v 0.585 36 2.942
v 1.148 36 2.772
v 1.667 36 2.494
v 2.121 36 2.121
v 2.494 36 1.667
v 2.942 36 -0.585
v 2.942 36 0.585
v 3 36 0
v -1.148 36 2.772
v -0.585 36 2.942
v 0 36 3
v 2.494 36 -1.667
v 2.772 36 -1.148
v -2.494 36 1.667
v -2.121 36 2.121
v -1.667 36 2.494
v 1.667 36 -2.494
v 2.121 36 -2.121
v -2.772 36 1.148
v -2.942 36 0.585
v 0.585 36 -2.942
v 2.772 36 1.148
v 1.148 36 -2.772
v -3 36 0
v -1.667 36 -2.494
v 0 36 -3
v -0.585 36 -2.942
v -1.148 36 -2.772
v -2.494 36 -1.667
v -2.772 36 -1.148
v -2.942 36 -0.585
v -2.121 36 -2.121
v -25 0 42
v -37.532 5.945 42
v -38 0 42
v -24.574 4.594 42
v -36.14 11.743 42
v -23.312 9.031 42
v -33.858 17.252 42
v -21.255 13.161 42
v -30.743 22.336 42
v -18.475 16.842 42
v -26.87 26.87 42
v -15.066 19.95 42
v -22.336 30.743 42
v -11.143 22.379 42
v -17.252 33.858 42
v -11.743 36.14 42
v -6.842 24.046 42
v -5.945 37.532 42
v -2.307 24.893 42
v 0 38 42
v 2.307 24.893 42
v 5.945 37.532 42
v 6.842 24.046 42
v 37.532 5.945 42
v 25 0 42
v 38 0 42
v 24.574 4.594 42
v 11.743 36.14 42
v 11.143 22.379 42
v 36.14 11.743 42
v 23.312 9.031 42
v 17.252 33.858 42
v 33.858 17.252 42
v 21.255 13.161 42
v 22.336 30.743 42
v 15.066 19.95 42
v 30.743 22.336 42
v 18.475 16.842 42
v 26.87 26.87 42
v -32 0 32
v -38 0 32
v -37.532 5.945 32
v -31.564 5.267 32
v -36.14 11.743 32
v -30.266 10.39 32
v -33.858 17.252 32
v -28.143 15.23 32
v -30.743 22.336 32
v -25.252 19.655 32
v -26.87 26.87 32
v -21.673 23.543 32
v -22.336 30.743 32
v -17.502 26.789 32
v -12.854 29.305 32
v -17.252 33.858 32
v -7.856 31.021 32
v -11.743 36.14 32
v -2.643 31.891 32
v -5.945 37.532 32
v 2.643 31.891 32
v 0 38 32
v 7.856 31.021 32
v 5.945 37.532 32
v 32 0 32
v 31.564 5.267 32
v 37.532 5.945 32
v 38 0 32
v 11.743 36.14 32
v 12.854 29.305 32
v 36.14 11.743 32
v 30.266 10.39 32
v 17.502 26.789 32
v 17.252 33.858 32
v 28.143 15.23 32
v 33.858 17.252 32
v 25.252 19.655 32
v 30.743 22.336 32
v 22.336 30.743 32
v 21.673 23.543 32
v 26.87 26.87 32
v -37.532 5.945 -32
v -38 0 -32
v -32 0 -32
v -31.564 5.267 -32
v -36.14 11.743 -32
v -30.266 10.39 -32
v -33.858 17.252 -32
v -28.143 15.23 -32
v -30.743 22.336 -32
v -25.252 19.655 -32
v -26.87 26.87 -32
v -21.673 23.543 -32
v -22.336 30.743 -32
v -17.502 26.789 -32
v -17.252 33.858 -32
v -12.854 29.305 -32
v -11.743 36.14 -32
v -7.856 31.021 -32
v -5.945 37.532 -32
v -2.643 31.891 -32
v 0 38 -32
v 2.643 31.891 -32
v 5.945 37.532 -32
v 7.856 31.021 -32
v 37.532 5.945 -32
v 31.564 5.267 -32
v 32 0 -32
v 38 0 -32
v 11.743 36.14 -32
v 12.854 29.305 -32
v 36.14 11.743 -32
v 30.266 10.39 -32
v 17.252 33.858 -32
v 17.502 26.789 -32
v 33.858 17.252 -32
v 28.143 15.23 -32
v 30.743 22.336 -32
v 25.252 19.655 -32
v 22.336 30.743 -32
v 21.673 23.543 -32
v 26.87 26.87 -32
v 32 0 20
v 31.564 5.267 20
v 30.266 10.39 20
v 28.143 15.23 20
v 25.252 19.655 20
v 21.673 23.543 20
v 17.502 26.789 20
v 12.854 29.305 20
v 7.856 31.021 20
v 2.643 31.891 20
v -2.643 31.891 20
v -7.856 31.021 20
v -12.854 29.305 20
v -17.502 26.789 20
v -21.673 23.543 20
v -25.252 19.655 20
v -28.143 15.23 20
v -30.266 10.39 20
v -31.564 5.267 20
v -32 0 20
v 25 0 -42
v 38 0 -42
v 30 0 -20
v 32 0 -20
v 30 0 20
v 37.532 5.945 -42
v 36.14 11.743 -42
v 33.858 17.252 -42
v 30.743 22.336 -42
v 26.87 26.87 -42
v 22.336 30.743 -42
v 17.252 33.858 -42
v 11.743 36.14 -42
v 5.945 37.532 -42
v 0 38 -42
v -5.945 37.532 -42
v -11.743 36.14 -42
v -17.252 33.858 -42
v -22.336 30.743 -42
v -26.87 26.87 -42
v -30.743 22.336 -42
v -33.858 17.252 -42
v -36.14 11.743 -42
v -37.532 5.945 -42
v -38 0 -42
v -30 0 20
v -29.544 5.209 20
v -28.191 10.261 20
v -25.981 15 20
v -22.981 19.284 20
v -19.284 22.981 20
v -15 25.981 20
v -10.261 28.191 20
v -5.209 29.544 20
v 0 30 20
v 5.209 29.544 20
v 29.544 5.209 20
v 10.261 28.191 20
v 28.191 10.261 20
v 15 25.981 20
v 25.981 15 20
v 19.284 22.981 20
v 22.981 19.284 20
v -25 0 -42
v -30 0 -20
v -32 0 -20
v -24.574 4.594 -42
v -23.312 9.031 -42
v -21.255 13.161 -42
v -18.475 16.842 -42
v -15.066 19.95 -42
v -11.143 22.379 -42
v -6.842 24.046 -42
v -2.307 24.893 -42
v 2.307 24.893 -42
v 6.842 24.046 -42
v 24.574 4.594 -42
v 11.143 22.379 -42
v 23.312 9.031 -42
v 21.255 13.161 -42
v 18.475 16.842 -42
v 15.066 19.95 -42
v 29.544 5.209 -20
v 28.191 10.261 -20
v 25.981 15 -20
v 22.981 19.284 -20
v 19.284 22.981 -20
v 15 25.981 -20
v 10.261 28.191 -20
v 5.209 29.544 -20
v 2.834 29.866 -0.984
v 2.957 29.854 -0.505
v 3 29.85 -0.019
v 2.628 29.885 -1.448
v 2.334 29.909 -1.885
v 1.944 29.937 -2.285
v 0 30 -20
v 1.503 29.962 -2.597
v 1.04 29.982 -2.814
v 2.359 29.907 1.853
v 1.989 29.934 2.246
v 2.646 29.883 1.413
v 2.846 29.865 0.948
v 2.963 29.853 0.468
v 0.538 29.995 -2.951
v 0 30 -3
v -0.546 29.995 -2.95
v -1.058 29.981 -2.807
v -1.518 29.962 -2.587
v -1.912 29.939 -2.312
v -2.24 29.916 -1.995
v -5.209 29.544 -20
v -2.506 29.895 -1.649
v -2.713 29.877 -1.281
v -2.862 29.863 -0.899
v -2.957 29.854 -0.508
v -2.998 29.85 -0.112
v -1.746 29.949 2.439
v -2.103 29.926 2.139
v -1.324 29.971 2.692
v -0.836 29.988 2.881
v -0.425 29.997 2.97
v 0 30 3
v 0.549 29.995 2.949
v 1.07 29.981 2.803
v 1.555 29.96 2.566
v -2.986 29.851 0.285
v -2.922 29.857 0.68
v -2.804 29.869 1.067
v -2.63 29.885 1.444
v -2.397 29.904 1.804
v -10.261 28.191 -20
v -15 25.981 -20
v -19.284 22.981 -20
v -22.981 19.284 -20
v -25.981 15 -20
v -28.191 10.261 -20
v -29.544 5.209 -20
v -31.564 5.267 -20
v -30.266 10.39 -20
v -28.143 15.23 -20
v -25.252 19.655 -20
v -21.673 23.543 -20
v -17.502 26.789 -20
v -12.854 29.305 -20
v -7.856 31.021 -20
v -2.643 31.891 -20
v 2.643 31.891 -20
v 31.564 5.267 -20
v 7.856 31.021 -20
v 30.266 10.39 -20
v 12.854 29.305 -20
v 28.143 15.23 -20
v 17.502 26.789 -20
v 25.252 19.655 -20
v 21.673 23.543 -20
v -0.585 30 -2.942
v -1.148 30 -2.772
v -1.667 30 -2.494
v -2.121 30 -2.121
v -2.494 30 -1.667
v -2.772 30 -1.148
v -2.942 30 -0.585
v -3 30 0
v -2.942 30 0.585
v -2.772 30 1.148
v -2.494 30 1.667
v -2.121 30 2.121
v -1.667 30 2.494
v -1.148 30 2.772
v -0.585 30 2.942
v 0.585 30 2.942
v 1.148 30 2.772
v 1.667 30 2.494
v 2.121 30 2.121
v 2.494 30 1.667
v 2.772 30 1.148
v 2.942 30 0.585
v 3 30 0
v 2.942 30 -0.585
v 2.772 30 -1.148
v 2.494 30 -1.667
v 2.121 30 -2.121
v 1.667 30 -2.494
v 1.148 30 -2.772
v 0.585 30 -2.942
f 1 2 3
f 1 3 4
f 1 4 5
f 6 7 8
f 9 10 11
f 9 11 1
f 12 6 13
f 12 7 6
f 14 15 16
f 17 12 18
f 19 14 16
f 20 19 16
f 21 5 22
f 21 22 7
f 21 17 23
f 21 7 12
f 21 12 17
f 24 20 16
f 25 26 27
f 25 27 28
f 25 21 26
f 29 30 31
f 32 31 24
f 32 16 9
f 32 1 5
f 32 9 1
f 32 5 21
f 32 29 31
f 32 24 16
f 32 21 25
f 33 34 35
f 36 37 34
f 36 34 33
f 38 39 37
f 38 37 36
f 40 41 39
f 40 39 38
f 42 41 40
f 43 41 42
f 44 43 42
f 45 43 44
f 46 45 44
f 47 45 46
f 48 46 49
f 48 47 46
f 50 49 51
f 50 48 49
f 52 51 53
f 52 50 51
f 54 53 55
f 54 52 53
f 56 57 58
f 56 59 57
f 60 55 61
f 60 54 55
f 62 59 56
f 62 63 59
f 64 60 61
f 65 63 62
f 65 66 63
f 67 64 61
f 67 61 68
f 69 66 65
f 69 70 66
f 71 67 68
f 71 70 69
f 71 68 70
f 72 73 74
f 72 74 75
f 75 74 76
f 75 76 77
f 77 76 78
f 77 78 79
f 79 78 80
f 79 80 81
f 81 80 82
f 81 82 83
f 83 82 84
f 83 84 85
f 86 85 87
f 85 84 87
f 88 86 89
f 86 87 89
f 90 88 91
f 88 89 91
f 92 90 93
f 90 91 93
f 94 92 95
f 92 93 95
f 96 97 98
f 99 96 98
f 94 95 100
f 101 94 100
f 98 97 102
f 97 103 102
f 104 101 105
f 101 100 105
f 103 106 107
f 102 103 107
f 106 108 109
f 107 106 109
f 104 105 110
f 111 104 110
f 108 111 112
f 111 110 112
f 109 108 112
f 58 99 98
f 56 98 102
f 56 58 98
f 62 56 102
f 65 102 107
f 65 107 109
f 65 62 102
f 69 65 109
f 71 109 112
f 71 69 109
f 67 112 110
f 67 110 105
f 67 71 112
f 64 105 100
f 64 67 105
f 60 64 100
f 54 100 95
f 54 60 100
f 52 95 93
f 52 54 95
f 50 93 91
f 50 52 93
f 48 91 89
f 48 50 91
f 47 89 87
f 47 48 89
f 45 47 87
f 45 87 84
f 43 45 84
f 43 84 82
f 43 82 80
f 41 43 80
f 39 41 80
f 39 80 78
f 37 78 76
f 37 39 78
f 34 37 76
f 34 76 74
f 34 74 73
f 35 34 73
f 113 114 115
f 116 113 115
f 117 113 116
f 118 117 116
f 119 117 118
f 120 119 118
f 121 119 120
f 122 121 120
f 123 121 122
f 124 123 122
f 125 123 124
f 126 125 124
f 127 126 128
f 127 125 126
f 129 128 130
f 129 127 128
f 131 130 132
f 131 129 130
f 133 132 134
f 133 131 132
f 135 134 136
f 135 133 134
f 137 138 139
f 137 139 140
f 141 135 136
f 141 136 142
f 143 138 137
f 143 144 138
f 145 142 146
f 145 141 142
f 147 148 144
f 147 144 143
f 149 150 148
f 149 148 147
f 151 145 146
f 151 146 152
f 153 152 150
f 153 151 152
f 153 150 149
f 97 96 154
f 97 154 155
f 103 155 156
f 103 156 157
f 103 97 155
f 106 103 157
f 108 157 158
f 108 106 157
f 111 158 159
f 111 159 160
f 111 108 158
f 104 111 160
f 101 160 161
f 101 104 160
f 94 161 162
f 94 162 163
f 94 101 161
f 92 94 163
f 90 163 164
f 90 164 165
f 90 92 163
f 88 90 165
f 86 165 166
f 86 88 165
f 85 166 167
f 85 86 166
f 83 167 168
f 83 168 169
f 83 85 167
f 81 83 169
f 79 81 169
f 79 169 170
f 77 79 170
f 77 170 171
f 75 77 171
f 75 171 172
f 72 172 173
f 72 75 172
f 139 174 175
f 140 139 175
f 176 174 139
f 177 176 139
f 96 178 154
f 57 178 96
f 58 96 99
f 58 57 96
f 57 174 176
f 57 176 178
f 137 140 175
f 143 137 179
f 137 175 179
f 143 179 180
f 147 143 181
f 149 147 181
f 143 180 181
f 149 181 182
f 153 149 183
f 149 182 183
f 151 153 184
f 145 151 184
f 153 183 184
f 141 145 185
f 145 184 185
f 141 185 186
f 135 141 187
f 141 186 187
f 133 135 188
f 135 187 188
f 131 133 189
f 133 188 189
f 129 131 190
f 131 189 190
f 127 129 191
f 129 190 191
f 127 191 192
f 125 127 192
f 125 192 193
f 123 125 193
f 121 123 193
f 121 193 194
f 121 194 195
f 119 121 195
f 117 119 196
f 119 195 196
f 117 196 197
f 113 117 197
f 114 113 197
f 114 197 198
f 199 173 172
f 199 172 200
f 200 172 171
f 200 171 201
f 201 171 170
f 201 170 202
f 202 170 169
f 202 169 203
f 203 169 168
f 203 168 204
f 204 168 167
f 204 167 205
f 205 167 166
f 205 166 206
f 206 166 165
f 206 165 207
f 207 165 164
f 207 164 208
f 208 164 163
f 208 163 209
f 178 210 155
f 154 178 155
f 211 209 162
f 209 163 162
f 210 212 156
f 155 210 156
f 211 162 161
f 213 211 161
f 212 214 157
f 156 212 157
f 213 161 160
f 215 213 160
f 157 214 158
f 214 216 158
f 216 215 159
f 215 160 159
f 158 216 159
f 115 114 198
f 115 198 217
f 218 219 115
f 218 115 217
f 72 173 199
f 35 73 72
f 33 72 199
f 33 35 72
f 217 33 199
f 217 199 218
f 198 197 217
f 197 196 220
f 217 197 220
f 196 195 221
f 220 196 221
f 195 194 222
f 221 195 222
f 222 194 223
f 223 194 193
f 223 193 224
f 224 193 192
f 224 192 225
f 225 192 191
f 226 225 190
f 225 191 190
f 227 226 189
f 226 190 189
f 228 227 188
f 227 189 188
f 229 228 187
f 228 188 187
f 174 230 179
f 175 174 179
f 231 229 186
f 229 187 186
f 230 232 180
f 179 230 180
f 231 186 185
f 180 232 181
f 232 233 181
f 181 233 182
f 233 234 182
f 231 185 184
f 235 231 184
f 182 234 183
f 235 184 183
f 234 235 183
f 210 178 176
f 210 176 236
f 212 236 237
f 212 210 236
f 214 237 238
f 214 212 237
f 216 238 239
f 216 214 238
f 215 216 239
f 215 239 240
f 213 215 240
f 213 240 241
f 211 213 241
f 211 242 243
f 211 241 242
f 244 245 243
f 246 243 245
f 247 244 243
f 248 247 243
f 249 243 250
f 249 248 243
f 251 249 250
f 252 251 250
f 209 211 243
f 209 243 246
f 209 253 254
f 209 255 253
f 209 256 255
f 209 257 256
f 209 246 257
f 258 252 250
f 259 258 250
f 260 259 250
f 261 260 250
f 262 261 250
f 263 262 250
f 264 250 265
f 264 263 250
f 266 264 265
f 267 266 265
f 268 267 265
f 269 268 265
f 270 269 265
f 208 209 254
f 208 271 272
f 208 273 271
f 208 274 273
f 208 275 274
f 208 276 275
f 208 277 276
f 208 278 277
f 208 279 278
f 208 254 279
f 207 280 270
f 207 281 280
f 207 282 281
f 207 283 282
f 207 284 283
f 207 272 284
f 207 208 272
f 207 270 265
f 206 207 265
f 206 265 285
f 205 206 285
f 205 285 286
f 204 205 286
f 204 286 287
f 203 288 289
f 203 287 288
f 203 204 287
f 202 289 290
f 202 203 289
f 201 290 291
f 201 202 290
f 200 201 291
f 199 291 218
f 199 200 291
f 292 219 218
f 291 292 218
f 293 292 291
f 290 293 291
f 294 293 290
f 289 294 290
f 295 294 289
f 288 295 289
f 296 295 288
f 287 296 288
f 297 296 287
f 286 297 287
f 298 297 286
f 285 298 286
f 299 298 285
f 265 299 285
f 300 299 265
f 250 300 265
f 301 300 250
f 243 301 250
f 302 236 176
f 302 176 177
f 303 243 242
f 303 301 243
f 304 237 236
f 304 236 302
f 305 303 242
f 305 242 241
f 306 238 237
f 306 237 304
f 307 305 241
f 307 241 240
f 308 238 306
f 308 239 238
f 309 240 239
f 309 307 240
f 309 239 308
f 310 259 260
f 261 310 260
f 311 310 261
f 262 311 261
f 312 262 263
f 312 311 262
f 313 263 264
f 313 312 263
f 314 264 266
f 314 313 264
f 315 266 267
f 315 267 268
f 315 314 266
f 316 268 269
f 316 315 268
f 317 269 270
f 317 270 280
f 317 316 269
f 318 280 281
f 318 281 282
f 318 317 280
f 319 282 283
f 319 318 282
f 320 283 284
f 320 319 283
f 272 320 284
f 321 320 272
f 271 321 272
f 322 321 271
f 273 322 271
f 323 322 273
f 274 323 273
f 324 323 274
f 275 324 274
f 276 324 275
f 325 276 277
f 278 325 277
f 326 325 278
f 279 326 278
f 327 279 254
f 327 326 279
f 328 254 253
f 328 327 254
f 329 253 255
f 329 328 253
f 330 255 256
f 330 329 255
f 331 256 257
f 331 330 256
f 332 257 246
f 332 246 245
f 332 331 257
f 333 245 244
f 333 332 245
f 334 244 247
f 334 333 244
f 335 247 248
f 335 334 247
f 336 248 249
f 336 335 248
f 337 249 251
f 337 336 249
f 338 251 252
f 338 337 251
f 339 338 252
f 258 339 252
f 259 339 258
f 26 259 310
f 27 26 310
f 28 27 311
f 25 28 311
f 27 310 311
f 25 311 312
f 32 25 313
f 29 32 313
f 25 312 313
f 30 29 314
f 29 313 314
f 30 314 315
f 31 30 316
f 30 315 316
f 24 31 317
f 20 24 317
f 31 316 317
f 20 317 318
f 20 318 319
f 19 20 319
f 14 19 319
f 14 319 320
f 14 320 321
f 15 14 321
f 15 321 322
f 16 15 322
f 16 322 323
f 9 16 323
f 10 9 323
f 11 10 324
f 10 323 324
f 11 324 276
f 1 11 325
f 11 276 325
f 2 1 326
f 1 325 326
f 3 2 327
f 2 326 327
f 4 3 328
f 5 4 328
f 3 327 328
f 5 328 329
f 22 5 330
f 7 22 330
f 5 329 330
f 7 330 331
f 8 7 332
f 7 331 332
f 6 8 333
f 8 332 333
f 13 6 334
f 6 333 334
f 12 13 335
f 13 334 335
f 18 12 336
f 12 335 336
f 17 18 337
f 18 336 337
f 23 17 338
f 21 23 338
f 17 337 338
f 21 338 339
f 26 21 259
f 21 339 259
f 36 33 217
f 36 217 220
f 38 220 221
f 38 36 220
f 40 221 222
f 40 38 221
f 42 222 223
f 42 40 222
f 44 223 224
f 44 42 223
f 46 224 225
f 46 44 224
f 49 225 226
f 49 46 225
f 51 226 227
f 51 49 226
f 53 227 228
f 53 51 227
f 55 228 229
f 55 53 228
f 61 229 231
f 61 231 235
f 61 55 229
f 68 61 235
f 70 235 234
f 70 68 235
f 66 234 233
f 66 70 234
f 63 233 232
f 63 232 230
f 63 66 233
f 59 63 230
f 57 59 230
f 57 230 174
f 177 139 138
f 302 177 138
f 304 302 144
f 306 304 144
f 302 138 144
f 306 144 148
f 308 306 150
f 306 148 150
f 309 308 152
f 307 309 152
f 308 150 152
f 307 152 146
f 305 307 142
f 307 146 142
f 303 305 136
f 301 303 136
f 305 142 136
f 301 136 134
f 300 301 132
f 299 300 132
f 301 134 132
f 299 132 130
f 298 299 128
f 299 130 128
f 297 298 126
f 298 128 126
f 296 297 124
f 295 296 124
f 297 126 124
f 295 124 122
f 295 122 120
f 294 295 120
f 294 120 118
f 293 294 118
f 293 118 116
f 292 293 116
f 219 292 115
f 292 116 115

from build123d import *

# Parameters (mm, degrees)
REVOLVE1_START                       = -42
REVOLVE1_DEPTH                       = 42
REVOLVE1_2_DEPTH                     = 10
REVOLVE1_START_2                     = -32
REVOLVE1_3_DEPTH                     = 12
SKETCH2_R                            = 3
BOSS_EXTRUDE1_DEPTH                  = 6
BOSS_EXTRUDE1_DIRECTION_2_REACH      = 66.094
BOSS_EXTRUDE1_DIRECTION_2_END_RADIUS = 30


# Read off the part's stored shape, not the designer's step: Revolve1
with BuildPart() as part:
    # Revolve1 outline → Revolve1 (new body)
    with BuildSketch(Plane.XY.offset(REVOLVE1_START)):
        with BuildLine():
            ThreePointArc((-25, 0), (0, 25), (25, 0))
            Line((25, 0), (30, 0))
            ThreePointArc((30, 0), (0, 30), (-30, 0))
            Line((-30, 0), (-25, 0))
        make_face()
    revolve1 = extrude(amount=REVOLVE1_DEPTH)



with BuildPart() as body_2:
    # Revolve1 2 outline → Revolve1 2 (new body)
    with BuildSketch(Plane.XY.offset(REVOLVE1_START)):
        with BuildLine():
            ThreePointArc((-30, 0), (0, 30), (30, 0))
            Line((30, 0), (38, 0))
            ThreePointArc((38, 0), (0, 38), (-38, 0))
            Line((-38, 0), (-30, 0))
        make_face()
    revolve1_2 = extrude(amount=REVOLVE1_2_DEPTH)


with BuildPart() as part_1:
    add(part.part)

    add(body_2.part)  # Revolve1 3 merges body 2
    # Revolve1 3 outline → Revolve1 3 (add)
    with BuildSketch(Plane.XY.offset(REVOLVE1_START_2)):
        with BuildLine():
            ThreePointArc((-30, 0), (0, 30), (30, 0))
            Line((30, 0), (32, 0))
            ThreePointArc((32, 0), (0, 32), (-32, 0))
            Line((-32, 0), (-30, 0))
        make_face()
    revolve1_3 = extrude(amount=REVOLVE1_3_DEPTH)

    # Mirror1: Revolve1, Revolve1 2, Revolve1 3 across plane
    add(revolve1.mirror(Plane(origin=(30, 0, 0), x_dir=(1, 0, 0), z_dir=(0, 0, -1))))
    add(revolve1_2.mirror(Plane(origin=(30, 0, 0), x_dir=(1, 0, 0), z_dir=(0, 0, -1))))
    add(revolve1_3.mirror(Plane(origin=(30, 0, 0), x_dir=(1, 0, 0), z_dir=(0, 0, -1))))

    # Sketch2 → Boss-Extrude1 (add)
    with BuildSketch(Plane(origin=(0, 30, 0), x_dir=(1, 0, 0), z_dir=(0, 1, 0))):
        with Locations(Location((0, 0, 0), (0, 0, 90))):
            Circle(SKETCH2_R)
    extrude(amount=BOSS_EXTRUDE1_DEPTH)

    # Boss-Extrude1 direction 2: up to this cylinder (the profile starts outside it)
    boss_extrude1_direction_2_end = Plane(origin=(0, 0, 0), z_dir=(0, 0, 1)) * Cylinder(BOSS_EXTRUDE1_DIRECTION_2_END_RADIUS, 193.188, mode=Mode.PRIVATE)
    # Sketch2 → Boss-Extrude1 direction 2 (add, up to the surface)
    with BuildSketch(Plane(origin=(0, 30, 0), x_dir=(1, 0, 0), z_dir=(0, 1, 0)), mode=Mode.PRIVATE) as boss_extrude1_direction_2_sk1:
        with Locations(Location((0, 0, 0), (0, 0, 90))):
            Circle(SKETCH2_R)
    boss_extrude1_direction_2_tool1 = extrude(boss_extrude1_direction_2_sk1.sketch, amount=-BOSS_EXTRUDE1_DIRECTION_2_REACH, mode=Mode.PRIVATE) - boss_extrude1_direction_2_end
    add(boss_extrude1_direction_2_tool1.solids().sort_by_distance((0, 30, 0))[0])
    add(boss_extrude1_direction_2_tool1.solids().sort_by_distance((0, 30, 0))[1])


solid = part_1.part
